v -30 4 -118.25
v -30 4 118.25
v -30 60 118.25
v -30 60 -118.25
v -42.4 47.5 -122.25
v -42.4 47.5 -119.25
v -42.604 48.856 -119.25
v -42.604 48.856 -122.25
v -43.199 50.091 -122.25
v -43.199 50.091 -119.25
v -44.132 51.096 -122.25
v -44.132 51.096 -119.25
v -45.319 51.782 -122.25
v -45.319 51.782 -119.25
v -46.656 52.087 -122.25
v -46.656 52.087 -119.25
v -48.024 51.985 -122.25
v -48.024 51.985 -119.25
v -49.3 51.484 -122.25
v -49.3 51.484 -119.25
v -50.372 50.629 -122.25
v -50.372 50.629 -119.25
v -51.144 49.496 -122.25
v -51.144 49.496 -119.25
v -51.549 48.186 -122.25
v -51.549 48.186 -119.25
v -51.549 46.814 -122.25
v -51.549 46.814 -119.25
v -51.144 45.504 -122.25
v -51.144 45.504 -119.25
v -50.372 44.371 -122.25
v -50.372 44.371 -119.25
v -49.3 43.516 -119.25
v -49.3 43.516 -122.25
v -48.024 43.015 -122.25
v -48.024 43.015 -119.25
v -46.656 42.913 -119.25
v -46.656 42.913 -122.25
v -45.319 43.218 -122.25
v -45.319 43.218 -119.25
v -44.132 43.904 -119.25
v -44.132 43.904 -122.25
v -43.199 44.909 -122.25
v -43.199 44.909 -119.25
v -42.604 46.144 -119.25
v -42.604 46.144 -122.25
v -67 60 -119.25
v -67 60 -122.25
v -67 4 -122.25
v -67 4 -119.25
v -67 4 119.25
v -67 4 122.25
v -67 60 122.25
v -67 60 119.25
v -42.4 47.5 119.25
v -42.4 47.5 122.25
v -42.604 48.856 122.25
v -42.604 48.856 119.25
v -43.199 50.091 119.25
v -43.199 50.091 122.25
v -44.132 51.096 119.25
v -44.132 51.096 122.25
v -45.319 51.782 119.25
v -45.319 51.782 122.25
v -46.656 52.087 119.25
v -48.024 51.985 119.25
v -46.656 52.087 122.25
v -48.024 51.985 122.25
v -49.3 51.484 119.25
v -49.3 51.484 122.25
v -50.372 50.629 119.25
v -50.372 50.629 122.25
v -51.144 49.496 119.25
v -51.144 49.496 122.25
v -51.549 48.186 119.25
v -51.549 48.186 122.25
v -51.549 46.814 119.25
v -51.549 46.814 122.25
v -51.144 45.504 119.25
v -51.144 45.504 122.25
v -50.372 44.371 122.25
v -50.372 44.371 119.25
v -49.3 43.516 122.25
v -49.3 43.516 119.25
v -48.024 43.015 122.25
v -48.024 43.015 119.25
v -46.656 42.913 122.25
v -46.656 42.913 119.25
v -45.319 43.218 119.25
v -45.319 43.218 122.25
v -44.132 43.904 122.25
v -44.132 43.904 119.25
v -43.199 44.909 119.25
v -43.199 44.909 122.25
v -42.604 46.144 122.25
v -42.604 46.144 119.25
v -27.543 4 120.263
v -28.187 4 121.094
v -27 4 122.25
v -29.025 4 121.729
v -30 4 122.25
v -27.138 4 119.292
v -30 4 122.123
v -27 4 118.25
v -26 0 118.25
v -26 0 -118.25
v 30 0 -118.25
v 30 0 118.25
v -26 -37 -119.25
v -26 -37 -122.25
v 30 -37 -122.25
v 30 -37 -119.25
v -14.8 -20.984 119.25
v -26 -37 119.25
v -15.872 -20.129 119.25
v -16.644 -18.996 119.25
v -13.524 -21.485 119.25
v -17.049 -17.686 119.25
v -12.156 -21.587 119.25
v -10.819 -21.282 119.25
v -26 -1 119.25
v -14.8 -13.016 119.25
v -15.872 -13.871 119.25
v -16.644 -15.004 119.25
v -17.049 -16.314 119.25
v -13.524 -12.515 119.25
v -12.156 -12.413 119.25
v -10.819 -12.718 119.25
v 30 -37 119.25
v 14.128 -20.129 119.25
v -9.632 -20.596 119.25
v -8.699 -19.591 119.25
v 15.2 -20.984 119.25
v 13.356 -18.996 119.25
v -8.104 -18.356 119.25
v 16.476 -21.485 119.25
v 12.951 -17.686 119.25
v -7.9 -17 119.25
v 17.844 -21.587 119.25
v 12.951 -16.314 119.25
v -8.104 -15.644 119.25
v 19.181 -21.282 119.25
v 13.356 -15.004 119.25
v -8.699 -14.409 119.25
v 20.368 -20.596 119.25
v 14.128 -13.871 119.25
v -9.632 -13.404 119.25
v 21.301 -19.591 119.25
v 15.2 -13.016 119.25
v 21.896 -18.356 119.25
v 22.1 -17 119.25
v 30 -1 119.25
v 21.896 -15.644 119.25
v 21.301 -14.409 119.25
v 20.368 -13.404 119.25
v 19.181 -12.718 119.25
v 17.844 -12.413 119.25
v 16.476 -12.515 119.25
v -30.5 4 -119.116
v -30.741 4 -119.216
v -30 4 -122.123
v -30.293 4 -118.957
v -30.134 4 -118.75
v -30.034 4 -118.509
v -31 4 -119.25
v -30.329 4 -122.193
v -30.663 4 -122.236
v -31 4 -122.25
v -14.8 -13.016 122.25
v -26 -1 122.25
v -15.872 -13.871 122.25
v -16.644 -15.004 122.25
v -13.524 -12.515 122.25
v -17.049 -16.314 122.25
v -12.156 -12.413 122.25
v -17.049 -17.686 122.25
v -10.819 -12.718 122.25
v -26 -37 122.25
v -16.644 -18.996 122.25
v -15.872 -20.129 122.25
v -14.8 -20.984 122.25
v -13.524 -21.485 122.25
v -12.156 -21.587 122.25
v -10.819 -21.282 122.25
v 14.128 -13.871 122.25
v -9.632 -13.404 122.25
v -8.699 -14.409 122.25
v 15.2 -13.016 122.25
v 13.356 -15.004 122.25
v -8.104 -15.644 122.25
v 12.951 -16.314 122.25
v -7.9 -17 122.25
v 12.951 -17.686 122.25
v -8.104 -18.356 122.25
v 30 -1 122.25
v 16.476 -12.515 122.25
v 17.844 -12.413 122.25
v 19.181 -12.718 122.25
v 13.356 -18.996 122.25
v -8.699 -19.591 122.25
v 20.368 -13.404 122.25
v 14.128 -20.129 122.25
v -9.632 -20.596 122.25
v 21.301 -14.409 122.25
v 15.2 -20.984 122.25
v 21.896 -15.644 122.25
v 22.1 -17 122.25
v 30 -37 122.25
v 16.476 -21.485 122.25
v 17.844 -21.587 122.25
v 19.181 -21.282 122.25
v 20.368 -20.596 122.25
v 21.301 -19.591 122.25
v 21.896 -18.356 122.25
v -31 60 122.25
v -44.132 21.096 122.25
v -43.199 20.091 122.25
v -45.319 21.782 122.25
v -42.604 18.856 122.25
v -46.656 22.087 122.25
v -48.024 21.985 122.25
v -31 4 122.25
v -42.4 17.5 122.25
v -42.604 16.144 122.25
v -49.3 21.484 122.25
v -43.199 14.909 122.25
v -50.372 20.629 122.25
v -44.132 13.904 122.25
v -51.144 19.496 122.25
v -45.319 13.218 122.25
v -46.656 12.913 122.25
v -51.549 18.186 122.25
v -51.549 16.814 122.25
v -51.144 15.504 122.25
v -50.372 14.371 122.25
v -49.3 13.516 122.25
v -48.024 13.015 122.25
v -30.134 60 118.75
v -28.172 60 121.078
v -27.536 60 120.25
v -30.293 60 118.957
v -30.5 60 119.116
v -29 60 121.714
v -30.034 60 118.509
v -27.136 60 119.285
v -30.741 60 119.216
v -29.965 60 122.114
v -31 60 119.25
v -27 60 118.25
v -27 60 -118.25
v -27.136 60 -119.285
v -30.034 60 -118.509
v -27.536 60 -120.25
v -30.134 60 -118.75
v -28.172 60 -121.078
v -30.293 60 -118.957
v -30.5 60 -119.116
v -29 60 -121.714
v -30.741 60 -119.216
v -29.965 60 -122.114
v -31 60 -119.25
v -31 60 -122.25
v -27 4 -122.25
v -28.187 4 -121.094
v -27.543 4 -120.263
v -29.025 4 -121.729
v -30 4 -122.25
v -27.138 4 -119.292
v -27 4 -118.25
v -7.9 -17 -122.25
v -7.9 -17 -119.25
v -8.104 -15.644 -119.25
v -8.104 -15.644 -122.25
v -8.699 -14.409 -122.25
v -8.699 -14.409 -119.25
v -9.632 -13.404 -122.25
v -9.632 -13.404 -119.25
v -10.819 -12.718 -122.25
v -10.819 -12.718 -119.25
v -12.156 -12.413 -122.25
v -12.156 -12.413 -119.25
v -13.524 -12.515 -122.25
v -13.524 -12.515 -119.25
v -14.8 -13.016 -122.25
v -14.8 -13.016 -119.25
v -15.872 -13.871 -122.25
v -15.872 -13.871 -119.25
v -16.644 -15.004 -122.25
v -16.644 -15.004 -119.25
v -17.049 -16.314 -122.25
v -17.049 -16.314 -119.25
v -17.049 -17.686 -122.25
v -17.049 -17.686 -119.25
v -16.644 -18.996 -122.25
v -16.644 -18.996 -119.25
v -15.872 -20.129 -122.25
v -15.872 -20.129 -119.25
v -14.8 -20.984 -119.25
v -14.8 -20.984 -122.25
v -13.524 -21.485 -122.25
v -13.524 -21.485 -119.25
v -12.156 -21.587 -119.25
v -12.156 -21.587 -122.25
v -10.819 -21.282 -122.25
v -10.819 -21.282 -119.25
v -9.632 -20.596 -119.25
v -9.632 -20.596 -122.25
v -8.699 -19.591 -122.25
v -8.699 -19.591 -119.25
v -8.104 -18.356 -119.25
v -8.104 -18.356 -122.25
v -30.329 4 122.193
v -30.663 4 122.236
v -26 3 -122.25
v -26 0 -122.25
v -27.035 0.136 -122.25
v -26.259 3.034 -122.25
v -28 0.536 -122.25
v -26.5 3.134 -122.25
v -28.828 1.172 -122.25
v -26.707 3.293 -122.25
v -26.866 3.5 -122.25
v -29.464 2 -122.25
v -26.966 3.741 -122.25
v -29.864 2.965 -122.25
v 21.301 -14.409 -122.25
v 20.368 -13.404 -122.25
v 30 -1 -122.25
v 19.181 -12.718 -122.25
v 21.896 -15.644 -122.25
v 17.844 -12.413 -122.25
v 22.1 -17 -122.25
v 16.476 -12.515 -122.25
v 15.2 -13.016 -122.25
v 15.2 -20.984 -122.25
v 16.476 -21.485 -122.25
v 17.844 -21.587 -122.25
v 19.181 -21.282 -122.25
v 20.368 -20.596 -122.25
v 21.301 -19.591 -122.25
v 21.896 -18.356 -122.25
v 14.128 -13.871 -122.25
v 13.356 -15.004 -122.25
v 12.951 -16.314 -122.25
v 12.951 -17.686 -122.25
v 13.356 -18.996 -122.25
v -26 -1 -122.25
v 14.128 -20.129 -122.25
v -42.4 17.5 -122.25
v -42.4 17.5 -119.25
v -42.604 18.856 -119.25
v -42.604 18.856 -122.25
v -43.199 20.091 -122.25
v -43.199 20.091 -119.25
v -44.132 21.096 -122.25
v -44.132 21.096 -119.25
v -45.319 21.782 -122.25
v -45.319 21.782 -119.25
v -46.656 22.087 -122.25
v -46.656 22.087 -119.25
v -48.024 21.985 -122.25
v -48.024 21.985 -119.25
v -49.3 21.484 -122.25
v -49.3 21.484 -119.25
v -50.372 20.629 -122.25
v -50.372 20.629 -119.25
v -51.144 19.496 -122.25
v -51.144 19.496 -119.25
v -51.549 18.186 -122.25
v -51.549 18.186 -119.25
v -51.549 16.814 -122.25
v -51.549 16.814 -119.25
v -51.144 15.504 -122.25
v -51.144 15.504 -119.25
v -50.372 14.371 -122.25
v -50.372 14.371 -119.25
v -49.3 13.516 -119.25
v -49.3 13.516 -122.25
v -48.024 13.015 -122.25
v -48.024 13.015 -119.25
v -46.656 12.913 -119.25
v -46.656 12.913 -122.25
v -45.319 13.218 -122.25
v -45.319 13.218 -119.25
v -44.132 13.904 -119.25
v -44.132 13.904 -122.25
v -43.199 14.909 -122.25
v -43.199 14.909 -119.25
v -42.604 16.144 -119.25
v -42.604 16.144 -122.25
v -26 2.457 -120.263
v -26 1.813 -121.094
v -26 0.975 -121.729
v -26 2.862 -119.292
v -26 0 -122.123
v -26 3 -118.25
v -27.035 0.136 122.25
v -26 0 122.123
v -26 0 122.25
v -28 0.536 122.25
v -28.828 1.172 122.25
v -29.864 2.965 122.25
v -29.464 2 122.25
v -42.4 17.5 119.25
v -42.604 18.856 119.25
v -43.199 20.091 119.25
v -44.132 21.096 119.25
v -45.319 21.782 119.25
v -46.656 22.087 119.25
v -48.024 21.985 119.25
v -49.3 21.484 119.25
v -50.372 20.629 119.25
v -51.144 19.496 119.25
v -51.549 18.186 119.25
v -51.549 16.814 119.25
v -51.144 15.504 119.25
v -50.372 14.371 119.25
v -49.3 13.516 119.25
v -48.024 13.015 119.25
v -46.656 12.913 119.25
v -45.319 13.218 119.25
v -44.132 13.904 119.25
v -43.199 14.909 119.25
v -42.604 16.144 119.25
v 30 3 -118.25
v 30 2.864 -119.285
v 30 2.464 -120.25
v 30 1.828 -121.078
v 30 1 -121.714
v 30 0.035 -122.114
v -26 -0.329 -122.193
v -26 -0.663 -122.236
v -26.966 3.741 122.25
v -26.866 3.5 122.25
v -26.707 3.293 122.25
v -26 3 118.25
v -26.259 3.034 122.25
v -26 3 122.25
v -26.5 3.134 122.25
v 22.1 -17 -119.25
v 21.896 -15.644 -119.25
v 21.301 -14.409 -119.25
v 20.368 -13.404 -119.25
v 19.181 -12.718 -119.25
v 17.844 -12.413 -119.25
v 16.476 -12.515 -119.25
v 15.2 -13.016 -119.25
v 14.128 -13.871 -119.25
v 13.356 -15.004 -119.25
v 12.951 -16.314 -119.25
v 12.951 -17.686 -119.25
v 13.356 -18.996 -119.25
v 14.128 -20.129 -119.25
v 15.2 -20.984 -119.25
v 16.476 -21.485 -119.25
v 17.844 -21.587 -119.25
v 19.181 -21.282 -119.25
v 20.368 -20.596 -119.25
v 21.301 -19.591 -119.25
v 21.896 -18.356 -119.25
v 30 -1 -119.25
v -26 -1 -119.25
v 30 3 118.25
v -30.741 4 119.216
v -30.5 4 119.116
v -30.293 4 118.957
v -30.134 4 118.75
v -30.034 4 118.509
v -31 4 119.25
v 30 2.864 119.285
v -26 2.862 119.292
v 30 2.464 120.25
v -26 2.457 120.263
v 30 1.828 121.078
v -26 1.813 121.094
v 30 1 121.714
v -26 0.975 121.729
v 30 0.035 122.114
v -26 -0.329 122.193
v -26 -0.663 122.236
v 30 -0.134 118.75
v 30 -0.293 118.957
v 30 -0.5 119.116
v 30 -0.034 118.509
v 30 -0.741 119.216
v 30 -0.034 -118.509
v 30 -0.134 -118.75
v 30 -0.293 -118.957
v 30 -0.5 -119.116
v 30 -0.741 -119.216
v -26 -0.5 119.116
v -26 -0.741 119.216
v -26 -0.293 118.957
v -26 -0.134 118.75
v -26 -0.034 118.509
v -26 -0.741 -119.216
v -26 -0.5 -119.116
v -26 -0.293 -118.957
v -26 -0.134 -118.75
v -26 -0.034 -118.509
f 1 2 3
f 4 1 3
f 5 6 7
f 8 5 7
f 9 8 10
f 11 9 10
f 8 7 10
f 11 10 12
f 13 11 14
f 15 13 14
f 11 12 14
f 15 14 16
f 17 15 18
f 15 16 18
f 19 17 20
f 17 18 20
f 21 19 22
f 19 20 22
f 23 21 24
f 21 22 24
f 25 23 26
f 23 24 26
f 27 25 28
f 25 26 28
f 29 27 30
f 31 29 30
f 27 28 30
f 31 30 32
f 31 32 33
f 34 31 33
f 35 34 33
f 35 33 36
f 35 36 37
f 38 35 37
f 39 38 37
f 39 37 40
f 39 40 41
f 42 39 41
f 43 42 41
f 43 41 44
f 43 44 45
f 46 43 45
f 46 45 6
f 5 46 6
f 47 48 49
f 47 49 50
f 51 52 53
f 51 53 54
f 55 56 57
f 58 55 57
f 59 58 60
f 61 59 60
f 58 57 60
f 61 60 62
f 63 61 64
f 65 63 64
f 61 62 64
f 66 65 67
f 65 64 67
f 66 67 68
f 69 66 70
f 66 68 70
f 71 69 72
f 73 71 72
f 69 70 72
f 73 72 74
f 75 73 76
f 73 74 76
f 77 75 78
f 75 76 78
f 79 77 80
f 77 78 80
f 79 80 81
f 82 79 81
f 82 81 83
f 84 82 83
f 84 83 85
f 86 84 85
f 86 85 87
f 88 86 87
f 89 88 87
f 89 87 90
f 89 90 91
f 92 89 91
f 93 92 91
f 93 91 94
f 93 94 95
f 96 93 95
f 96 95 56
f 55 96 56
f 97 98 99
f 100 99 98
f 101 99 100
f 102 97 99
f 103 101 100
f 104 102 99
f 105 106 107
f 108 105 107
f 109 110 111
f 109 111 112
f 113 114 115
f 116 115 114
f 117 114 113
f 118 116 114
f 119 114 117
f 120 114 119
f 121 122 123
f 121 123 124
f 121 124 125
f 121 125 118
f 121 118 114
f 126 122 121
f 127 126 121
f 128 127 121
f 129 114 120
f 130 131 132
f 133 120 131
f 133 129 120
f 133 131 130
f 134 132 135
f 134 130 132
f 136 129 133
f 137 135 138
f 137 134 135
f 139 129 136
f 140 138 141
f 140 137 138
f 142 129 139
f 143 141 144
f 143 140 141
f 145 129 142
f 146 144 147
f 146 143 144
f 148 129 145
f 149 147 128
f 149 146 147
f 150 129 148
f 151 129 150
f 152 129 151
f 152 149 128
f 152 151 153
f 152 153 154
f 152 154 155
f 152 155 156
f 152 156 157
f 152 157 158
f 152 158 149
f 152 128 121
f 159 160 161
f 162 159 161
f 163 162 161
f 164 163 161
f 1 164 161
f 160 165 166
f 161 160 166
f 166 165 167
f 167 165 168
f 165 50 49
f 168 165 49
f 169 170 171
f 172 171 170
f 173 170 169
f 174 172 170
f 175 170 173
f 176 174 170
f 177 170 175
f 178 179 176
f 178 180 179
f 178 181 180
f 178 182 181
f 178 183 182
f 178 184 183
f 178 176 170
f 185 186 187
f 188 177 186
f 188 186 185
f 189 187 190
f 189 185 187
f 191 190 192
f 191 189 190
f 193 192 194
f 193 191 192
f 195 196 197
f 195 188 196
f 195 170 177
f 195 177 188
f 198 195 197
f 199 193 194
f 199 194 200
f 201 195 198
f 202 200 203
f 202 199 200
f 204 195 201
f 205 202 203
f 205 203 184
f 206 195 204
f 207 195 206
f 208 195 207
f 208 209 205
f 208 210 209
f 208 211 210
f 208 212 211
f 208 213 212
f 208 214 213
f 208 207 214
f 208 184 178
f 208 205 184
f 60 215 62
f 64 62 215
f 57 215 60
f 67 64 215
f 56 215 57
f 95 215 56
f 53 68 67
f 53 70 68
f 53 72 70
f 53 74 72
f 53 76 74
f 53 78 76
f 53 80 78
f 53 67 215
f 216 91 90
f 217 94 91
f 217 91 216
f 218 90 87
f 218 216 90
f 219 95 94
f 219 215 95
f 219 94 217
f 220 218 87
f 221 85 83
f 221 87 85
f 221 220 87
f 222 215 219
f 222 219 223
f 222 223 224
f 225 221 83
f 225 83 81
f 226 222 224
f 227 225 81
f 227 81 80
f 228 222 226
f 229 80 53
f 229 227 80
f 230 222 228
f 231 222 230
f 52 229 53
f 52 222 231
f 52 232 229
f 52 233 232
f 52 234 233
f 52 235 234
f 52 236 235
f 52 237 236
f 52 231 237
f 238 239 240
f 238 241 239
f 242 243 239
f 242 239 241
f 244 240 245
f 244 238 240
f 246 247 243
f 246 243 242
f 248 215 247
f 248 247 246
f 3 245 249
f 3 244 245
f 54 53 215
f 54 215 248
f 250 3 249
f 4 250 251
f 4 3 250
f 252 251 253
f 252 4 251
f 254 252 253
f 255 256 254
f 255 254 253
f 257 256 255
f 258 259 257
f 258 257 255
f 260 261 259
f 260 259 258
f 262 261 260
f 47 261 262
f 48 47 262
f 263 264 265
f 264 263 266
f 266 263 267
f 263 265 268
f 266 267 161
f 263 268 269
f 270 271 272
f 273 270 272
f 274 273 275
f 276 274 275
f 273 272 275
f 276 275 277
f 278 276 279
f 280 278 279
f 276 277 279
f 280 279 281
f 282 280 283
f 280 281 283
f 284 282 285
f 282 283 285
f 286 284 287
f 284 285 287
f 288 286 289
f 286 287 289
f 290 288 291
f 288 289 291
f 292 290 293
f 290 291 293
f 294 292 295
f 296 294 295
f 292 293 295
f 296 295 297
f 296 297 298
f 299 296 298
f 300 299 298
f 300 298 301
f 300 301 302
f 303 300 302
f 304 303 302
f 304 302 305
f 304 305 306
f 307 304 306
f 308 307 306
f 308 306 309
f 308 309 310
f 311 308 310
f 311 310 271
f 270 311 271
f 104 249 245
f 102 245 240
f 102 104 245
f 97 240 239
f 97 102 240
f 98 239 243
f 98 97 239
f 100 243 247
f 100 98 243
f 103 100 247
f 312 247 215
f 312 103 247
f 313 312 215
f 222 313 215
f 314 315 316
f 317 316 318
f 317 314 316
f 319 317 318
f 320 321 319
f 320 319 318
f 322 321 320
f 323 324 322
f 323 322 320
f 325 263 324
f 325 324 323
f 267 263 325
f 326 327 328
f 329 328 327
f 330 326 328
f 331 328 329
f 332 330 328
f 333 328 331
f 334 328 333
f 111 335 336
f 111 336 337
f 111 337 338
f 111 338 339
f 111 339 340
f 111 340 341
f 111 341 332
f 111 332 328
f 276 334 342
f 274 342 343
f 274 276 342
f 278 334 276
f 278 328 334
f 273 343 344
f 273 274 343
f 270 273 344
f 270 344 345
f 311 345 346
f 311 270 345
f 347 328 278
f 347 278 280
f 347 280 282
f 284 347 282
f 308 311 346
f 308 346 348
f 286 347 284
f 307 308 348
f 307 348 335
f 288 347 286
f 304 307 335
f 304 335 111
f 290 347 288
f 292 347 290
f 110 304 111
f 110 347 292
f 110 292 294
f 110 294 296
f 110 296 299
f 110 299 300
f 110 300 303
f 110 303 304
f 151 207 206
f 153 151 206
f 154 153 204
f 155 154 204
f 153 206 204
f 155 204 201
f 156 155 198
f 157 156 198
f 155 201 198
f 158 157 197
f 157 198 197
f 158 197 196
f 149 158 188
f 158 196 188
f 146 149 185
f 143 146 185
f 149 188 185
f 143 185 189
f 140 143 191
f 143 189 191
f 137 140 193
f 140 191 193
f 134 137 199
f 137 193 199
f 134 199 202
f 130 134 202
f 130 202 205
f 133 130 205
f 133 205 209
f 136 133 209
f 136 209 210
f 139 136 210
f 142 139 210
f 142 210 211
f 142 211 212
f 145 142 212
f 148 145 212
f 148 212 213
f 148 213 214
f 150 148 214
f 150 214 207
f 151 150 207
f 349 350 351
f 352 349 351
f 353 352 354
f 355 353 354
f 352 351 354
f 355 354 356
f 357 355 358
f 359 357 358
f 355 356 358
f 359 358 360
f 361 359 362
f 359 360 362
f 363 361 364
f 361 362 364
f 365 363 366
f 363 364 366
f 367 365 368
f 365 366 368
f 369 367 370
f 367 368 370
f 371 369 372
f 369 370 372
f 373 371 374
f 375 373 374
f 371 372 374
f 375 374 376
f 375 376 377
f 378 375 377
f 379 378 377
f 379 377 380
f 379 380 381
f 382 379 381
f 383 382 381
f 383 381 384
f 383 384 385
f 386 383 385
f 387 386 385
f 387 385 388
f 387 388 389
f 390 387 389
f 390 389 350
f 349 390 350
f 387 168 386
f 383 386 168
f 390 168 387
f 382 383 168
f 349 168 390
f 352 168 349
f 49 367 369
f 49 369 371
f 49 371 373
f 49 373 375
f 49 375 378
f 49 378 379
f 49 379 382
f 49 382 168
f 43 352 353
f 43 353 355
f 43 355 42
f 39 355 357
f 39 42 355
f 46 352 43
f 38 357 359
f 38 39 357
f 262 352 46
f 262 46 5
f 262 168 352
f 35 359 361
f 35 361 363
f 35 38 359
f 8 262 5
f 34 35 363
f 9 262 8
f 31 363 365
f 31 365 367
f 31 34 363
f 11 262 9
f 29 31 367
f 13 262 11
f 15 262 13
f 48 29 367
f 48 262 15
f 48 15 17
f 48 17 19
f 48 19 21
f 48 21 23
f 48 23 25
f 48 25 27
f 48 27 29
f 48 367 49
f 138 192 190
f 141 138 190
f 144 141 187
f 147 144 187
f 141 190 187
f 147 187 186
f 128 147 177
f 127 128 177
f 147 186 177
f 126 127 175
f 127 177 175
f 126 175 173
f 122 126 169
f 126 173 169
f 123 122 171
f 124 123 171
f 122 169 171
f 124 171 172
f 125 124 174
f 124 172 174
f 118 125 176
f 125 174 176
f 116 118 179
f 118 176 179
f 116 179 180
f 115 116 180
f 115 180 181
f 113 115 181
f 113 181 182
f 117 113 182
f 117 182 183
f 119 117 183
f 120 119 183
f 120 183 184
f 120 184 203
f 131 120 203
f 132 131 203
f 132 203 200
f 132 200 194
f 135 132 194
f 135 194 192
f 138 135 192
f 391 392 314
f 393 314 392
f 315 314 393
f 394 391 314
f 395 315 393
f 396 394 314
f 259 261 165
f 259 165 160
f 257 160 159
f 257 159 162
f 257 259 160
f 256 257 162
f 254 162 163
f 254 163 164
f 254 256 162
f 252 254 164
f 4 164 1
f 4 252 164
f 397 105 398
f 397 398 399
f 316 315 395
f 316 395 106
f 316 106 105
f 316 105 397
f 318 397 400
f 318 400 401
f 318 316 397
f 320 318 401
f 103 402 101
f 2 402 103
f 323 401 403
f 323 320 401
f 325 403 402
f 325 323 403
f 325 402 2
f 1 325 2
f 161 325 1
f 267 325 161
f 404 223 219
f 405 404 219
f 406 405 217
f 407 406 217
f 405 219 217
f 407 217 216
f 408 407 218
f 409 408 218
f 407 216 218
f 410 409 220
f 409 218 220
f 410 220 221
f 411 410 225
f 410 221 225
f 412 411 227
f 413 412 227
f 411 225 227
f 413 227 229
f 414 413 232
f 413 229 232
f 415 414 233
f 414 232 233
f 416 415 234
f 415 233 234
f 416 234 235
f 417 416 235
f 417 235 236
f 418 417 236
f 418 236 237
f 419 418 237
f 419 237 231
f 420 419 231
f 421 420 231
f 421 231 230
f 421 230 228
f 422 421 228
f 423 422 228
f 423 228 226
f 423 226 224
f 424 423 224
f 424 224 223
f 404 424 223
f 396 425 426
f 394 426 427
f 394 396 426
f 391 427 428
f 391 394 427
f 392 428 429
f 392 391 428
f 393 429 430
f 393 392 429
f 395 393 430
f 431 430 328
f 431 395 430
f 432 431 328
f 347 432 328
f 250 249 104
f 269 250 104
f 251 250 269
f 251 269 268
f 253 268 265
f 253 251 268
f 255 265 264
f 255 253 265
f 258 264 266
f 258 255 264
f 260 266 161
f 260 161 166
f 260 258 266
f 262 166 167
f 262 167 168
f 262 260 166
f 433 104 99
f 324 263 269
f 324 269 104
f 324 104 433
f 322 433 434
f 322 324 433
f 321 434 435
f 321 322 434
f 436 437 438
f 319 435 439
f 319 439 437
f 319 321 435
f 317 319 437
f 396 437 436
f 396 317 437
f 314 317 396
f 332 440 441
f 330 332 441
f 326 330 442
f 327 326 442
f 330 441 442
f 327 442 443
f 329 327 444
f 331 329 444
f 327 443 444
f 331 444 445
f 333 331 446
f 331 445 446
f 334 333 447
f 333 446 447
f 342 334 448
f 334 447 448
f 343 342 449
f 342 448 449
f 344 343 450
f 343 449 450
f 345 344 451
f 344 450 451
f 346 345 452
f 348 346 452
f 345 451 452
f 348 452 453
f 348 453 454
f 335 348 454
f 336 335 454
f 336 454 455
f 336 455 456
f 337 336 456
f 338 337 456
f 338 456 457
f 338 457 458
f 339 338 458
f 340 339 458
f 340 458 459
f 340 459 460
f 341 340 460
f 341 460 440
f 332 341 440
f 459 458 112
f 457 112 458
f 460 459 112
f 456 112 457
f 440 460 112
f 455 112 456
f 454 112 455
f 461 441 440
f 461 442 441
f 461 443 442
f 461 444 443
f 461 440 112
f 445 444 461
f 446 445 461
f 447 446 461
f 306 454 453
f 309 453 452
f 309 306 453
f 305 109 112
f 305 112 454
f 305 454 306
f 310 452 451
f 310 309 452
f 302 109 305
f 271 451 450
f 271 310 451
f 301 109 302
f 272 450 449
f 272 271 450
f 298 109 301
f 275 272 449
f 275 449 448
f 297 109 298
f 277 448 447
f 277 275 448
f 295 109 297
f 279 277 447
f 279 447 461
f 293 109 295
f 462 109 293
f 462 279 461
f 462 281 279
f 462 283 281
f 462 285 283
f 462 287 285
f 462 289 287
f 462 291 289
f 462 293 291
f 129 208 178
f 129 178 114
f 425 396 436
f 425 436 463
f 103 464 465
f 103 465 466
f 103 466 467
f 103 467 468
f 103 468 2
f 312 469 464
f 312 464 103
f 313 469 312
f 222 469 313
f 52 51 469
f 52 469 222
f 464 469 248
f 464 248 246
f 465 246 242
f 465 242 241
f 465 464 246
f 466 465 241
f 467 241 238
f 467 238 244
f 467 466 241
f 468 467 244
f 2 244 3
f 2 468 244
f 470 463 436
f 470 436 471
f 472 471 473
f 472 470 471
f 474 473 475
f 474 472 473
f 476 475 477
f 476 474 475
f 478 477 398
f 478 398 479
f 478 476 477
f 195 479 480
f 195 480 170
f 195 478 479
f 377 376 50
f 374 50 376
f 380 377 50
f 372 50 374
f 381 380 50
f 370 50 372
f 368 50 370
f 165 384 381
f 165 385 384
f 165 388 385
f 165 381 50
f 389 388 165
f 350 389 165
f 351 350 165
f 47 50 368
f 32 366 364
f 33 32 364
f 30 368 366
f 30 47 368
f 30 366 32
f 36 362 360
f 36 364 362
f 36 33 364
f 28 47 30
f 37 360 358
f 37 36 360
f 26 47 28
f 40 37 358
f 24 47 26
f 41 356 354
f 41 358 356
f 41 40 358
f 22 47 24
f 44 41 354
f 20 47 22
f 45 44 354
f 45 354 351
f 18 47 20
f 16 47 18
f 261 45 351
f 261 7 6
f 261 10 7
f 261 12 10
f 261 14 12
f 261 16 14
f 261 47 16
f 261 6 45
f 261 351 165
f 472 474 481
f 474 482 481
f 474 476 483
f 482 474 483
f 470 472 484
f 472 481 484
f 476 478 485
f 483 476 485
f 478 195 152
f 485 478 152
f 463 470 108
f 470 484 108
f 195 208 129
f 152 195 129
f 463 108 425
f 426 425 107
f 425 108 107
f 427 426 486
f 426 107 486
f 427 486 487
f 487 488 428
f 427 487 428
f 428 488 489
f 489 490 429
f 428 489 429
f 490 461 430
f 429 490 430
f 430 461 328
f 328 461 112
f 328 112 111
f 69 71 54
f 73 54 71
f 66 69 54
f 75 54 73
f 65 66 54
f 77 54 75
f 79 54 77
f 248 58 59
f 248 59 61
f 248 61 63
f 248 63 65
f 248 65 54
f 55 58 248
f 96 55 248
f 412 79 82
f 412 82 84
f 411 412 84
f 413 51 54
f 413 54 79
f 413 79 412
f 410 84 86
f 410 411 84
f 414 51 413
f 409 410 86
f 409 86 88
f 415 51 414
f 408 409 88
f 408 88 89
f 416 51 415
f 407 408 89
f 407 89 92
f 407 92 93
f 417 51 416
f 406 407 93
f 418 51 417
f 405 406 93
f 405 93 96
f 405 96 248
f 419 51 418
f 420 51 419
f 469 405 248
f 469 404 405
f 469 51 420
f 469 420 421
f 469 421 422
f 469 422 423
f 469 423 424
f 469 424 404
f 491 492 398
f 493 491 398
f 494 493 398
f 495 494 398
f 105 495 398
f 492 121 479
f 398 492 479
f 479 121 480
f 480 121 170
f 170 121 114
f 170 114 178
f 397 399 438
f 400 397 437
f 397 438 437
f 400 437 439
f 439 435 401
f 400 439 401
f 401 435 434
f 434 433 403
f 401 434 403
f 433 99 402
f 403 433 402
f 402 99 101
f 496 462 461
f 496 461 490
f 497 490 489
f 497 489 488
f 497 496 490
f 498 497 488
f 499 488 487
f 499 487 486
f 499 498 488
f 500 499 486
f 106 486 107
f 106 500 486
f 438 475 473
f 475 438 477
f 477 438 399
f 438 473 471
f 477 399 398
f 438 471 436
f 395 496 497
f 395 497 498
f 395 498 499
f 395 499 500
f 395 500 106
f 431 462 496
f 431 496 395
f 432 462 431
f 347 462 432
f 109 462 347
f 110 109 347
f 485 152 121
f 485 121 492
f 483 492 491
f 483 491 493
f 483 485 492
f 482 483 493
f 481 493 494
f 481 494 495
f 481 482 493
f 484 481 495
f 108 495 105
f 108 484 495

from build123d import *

# Parameters (mm, degrees)
SKETCH1_W                      = 60
SKETCH1_H                      = 244.5
BASE_FLANGE1_DEPTH             = 3
EDGE_FLANGE1_STRIP_W           = 14
EDGE_FLANGE1_STRIP_H           = 3
EDGE_FLANGE1_STRIP_CUT_DEPTH   = 244.5
EDGE_FLANGE1_DEPTH             = 244.5
EDGE_FLANGE2_STRIP_W           = 14
EDGE_FLANGE2_STRIP_H           = 3
EDGE_FLANGE2_STRIP_CUT_DEPTH   = 56
EDGE_FLANGE2_STRIP_2_W         = 14
EDGE_FLANGE2_STRIP_2_H         = 3
EDGE_FLANGE2_STRIP_CUT_2_DEPTH = 56
EDGE_FLANGE2_STRIP_3_W         = 14
EDGE_FLANGE2_STRIP_3_H         = 3
EDGE_FLANGE2_STRIP_CUT_3_DEPTH = 56
EDGE_FLANGE2_STRIP_4_W         = 14
EDGE_FLANGE2_STRIP_4_H         = 3
EDGE_FLANGE2_STRIP_CUT_4_DEPTH = 56
EDGE_FLANGE2_DEPTH             = 56
EDGE_FLANGE2_BEND_DEPTH        = 56
EDGE_FLANGE2_BEND_2_DEPTH      = 56
EDGE_FLANGE2_BEND_3_DEPTH      = 56
SKETCH18_R                     = 4.6
EXTRUDE1_DEPTH                 = 261.517273899


# Sheet-metal steps are written as plain solids
with BuildPart() as part:
    # Sketch1 → Base-Flange1 (new body)
    with BuildSketch(Plane(origin=(0, 0, 0), x_dir=(1, 0, 0), z_dir=(0, 1, 0))):
        Rectangle(SKETCH1_W, SKETCH1_H)
    extrude(amount=BASE_FLANGE1_DEPTH)

    # Edge-Flange1 strip (across the edge) → Edge-Flange1 strip cut (cut)
    with BuildSketch(Plane(origin=(-30, 3, -122.25), x_dir=(1, 0, 0), z_dir=(0, 0, 1))):
        with Locations((-3, -1.5)):
            Rectangle(EDGE_FLANGE1_STRIP_W, EDGE_FLANGE1_STRIP_H)
    extrude(amount=EDGE_FLANGE1_STRIP_CUT_DEPTH, mode=Mode.SUBTRACT)

    # Edge-Flange1 section (across the edge) → Edge-Flange1 (add)
    with BuildSketch(Plane(origin=(-30, 3, -122.25), x_dir=(1, 0, 0), z_dir=(0, 0, 1))):
        with BuildLine():
            Line((0, 1), (0, 57))
            Line((0, 57), (3, 57))
            Line((3, 57), (3, 1))
            ThreePointArc((3, 1), (3.292893219, 0.292893219), (4, 0))
            Line((4, 0), (4, -3))
            ThreePointArc((4, -3), (1.171572875, -1.828427125), (0, 1))
        make_face()
    extrude(amount=EDGE_FLANGE1_DEPTH)

    # Edge-Flange2 strip (across the edge) → Edge-Flange2 strip cut (cut)
    with BuildSketch(Plane(origin=(-30, 4, 122.25), x_dir=(0, 0, -1), z_dir=(0, 1, 0))):
        with Locations((-3, -1.5)):
            Rectangle(EDGE_FLANGE2_STRIP_W, EDGE_FLANGE2_STRIP_H)
    extrude(amount=EDGE_FLANGE2_STRIP_CUT_DEPTH, mode=Mode.SUBTRACT)

    # Edge-Flange2 strip 2 (across the edge) → Edge-Flange2 strip cut 2 (cut)
    with BuildSketch(Plane(origin=(30, 0, 122.25), x_dir=(0, 0, -1), z_dir=(-1, 0, 0))):
        with Locations((-3, -1.5)):
            Rectangle(EDGE_FLANGE2_STRIP_2_W, EDGE_FLANGE2_STRIP_2_H)
    extrude(amount=EDGE_FLANGE2_STRIP_CUT_2_DEPTH, mode=Mode.SUBTRACT)

    # Edge-Flange2 strip 3 (across the edge) → Edge-Flange2 strip cut 3 (cut)
    with BuildSketch(Plane(origin=(-30, 60, -122.25), x_dir=(0, 0, 1), z_dir=(0, -1, 0))):
        with Locations((-3, -1.5)):
            Rectangle(EDGE_FLANGE2_STRIP_3_W, EDGE_FLANGE2_STRIP_3_H)
    extrude(amount=EDGE_FLANGE2_STRIP_CUT_3_DEPTH, mode=Mode.SUBTRACT)

    # Edge-Flange2 strip 4 (across the edge) → Edge-Flange2 strip cut 4 (cut)
    with BuildSketch(Plane(origin=(-26, 0, -122.25), x_dir=(0, 0, 1), z_dir=(1, 0, 0))):
        with Locations((-3, -1.5)):
            Rectangle(EDGE_FLANGE2_STRIP_4_W, EDGE_FLANGE2_STRIP_4_H)
    extrude(amount=EDGE_FLANGE2_STRIP_CUT_4_DEPTH, mode=Mode.SUBTRACT)

    # Edge-Flange2 section (across the edge) → Edge-Flange2 (add)
    with BuildSketch(Plane(origin=(-30, 4, 122.25), x_dir=(0, 0, -1), z_dir=(0, 1, 0))):
        with BuildLine():
            Line((0, 1), (0, 37))
            Line((0, 37), (3, 37))
            Line((3, 37), (3, 1))
            ThreePointArc((3, 1), (3.292893219, 0.292893219), (4, 0))
            Line((4, 0), (4, -3))
            ThreePointArc((4, -3), (1.171572875, -1.828427125), (0, 1))
        make_face()
    extrude(amount=EDGE_FLANGE2_DEPTH)

    # Edge-Flange2 section 2 (across the edge) → Edge-Flange2 bend (add)
    with BuildSketch(Plane(origin=(30, 0, 122.25), x_dir=(0, 0, -1), z_dir=(-1, 0, 0))):
        with BuildLine():
            Line((0, 1), (0, 37))
            Line((0, 37), (3, 37))
            Line((3, 37), (3, 1))
            ThreePointArc((3, 1), (3.292893219, 0.292893219), (4, 0))
            Line((4, 0), (4, -3))
            ThreePointArc((4, -3), (1.171572875, -1.828427125), (0, 1))
        make_face()
    extrude(amount=EDGE_FLANGE2_BEND_DEPTH)

    # Edge-Flange2 section 3 (across the edge) → Edge-Flange2 bend 2 (add)
    with BuildSketch(Plane(origin=(-30, 60, -122.25), x_dir=(0, 0, 1), z_dir=(0, -1, 0))):
        with BuildLine():
            Line((0, 1), (0, 37))
            Line((0, 37), (3, 37))
            Line((3, 37), (3, 1))
            ThreePointArc((3, 1), (3.292893219, 0.292893219), (4, 0))
            Line((4, 0), (4, -3))
            ThreePointArc((4, -3), (1.171572875, -1.828427125), (0, 1))
        make_face()
    extrude(amount=EDGE_FLANGE2_BEND_2_DEPTH)

    # Edge-Flange2 section 4 (across the edge) → Edge-Flange2 bend 3 (add)
    with BuildSketch(Plane(origin=(-26, 0, -122.25), x_dir=(0, 0, 1), z_dir=(1, 0, 0))):
        with BuildLine():
            Line((0, 1), (0, 37))
            Line((0, 37), (3, 37))
            Line((3, 37), (3, 1))
            ThreePointArc((3, 1), (3.292893219, 0.292893219), (4, 0))
            Line((4, 0), (4, -3))
            ThreePointArc((4, -3), (1.171572875, -1.828427125), (0, 1))
        make_face()
    extrude(amount=EDGE_FLANGE2_BEND_3_DEPTH)

    # Sketch18 → Extrude1 (cut, through all)
    with BuildSketch(Plane.XY.offset(122.25)):
        with Locations((-47, 47.5)):
            Circle(SKETCH18_R)
        with Locations((-47, 17.5)):
            Circle(SKETCH18_R)
        with Locations((-12.5, -17)):
            Circle(SKETCH18_R)
        with Locations((17.5, -17)):
            Circle(SKETCH18_R)
    extrude(amount=-EXTRUDE1_DEPTH, mode=Mode.SUBTRACT)


solid = part.part
